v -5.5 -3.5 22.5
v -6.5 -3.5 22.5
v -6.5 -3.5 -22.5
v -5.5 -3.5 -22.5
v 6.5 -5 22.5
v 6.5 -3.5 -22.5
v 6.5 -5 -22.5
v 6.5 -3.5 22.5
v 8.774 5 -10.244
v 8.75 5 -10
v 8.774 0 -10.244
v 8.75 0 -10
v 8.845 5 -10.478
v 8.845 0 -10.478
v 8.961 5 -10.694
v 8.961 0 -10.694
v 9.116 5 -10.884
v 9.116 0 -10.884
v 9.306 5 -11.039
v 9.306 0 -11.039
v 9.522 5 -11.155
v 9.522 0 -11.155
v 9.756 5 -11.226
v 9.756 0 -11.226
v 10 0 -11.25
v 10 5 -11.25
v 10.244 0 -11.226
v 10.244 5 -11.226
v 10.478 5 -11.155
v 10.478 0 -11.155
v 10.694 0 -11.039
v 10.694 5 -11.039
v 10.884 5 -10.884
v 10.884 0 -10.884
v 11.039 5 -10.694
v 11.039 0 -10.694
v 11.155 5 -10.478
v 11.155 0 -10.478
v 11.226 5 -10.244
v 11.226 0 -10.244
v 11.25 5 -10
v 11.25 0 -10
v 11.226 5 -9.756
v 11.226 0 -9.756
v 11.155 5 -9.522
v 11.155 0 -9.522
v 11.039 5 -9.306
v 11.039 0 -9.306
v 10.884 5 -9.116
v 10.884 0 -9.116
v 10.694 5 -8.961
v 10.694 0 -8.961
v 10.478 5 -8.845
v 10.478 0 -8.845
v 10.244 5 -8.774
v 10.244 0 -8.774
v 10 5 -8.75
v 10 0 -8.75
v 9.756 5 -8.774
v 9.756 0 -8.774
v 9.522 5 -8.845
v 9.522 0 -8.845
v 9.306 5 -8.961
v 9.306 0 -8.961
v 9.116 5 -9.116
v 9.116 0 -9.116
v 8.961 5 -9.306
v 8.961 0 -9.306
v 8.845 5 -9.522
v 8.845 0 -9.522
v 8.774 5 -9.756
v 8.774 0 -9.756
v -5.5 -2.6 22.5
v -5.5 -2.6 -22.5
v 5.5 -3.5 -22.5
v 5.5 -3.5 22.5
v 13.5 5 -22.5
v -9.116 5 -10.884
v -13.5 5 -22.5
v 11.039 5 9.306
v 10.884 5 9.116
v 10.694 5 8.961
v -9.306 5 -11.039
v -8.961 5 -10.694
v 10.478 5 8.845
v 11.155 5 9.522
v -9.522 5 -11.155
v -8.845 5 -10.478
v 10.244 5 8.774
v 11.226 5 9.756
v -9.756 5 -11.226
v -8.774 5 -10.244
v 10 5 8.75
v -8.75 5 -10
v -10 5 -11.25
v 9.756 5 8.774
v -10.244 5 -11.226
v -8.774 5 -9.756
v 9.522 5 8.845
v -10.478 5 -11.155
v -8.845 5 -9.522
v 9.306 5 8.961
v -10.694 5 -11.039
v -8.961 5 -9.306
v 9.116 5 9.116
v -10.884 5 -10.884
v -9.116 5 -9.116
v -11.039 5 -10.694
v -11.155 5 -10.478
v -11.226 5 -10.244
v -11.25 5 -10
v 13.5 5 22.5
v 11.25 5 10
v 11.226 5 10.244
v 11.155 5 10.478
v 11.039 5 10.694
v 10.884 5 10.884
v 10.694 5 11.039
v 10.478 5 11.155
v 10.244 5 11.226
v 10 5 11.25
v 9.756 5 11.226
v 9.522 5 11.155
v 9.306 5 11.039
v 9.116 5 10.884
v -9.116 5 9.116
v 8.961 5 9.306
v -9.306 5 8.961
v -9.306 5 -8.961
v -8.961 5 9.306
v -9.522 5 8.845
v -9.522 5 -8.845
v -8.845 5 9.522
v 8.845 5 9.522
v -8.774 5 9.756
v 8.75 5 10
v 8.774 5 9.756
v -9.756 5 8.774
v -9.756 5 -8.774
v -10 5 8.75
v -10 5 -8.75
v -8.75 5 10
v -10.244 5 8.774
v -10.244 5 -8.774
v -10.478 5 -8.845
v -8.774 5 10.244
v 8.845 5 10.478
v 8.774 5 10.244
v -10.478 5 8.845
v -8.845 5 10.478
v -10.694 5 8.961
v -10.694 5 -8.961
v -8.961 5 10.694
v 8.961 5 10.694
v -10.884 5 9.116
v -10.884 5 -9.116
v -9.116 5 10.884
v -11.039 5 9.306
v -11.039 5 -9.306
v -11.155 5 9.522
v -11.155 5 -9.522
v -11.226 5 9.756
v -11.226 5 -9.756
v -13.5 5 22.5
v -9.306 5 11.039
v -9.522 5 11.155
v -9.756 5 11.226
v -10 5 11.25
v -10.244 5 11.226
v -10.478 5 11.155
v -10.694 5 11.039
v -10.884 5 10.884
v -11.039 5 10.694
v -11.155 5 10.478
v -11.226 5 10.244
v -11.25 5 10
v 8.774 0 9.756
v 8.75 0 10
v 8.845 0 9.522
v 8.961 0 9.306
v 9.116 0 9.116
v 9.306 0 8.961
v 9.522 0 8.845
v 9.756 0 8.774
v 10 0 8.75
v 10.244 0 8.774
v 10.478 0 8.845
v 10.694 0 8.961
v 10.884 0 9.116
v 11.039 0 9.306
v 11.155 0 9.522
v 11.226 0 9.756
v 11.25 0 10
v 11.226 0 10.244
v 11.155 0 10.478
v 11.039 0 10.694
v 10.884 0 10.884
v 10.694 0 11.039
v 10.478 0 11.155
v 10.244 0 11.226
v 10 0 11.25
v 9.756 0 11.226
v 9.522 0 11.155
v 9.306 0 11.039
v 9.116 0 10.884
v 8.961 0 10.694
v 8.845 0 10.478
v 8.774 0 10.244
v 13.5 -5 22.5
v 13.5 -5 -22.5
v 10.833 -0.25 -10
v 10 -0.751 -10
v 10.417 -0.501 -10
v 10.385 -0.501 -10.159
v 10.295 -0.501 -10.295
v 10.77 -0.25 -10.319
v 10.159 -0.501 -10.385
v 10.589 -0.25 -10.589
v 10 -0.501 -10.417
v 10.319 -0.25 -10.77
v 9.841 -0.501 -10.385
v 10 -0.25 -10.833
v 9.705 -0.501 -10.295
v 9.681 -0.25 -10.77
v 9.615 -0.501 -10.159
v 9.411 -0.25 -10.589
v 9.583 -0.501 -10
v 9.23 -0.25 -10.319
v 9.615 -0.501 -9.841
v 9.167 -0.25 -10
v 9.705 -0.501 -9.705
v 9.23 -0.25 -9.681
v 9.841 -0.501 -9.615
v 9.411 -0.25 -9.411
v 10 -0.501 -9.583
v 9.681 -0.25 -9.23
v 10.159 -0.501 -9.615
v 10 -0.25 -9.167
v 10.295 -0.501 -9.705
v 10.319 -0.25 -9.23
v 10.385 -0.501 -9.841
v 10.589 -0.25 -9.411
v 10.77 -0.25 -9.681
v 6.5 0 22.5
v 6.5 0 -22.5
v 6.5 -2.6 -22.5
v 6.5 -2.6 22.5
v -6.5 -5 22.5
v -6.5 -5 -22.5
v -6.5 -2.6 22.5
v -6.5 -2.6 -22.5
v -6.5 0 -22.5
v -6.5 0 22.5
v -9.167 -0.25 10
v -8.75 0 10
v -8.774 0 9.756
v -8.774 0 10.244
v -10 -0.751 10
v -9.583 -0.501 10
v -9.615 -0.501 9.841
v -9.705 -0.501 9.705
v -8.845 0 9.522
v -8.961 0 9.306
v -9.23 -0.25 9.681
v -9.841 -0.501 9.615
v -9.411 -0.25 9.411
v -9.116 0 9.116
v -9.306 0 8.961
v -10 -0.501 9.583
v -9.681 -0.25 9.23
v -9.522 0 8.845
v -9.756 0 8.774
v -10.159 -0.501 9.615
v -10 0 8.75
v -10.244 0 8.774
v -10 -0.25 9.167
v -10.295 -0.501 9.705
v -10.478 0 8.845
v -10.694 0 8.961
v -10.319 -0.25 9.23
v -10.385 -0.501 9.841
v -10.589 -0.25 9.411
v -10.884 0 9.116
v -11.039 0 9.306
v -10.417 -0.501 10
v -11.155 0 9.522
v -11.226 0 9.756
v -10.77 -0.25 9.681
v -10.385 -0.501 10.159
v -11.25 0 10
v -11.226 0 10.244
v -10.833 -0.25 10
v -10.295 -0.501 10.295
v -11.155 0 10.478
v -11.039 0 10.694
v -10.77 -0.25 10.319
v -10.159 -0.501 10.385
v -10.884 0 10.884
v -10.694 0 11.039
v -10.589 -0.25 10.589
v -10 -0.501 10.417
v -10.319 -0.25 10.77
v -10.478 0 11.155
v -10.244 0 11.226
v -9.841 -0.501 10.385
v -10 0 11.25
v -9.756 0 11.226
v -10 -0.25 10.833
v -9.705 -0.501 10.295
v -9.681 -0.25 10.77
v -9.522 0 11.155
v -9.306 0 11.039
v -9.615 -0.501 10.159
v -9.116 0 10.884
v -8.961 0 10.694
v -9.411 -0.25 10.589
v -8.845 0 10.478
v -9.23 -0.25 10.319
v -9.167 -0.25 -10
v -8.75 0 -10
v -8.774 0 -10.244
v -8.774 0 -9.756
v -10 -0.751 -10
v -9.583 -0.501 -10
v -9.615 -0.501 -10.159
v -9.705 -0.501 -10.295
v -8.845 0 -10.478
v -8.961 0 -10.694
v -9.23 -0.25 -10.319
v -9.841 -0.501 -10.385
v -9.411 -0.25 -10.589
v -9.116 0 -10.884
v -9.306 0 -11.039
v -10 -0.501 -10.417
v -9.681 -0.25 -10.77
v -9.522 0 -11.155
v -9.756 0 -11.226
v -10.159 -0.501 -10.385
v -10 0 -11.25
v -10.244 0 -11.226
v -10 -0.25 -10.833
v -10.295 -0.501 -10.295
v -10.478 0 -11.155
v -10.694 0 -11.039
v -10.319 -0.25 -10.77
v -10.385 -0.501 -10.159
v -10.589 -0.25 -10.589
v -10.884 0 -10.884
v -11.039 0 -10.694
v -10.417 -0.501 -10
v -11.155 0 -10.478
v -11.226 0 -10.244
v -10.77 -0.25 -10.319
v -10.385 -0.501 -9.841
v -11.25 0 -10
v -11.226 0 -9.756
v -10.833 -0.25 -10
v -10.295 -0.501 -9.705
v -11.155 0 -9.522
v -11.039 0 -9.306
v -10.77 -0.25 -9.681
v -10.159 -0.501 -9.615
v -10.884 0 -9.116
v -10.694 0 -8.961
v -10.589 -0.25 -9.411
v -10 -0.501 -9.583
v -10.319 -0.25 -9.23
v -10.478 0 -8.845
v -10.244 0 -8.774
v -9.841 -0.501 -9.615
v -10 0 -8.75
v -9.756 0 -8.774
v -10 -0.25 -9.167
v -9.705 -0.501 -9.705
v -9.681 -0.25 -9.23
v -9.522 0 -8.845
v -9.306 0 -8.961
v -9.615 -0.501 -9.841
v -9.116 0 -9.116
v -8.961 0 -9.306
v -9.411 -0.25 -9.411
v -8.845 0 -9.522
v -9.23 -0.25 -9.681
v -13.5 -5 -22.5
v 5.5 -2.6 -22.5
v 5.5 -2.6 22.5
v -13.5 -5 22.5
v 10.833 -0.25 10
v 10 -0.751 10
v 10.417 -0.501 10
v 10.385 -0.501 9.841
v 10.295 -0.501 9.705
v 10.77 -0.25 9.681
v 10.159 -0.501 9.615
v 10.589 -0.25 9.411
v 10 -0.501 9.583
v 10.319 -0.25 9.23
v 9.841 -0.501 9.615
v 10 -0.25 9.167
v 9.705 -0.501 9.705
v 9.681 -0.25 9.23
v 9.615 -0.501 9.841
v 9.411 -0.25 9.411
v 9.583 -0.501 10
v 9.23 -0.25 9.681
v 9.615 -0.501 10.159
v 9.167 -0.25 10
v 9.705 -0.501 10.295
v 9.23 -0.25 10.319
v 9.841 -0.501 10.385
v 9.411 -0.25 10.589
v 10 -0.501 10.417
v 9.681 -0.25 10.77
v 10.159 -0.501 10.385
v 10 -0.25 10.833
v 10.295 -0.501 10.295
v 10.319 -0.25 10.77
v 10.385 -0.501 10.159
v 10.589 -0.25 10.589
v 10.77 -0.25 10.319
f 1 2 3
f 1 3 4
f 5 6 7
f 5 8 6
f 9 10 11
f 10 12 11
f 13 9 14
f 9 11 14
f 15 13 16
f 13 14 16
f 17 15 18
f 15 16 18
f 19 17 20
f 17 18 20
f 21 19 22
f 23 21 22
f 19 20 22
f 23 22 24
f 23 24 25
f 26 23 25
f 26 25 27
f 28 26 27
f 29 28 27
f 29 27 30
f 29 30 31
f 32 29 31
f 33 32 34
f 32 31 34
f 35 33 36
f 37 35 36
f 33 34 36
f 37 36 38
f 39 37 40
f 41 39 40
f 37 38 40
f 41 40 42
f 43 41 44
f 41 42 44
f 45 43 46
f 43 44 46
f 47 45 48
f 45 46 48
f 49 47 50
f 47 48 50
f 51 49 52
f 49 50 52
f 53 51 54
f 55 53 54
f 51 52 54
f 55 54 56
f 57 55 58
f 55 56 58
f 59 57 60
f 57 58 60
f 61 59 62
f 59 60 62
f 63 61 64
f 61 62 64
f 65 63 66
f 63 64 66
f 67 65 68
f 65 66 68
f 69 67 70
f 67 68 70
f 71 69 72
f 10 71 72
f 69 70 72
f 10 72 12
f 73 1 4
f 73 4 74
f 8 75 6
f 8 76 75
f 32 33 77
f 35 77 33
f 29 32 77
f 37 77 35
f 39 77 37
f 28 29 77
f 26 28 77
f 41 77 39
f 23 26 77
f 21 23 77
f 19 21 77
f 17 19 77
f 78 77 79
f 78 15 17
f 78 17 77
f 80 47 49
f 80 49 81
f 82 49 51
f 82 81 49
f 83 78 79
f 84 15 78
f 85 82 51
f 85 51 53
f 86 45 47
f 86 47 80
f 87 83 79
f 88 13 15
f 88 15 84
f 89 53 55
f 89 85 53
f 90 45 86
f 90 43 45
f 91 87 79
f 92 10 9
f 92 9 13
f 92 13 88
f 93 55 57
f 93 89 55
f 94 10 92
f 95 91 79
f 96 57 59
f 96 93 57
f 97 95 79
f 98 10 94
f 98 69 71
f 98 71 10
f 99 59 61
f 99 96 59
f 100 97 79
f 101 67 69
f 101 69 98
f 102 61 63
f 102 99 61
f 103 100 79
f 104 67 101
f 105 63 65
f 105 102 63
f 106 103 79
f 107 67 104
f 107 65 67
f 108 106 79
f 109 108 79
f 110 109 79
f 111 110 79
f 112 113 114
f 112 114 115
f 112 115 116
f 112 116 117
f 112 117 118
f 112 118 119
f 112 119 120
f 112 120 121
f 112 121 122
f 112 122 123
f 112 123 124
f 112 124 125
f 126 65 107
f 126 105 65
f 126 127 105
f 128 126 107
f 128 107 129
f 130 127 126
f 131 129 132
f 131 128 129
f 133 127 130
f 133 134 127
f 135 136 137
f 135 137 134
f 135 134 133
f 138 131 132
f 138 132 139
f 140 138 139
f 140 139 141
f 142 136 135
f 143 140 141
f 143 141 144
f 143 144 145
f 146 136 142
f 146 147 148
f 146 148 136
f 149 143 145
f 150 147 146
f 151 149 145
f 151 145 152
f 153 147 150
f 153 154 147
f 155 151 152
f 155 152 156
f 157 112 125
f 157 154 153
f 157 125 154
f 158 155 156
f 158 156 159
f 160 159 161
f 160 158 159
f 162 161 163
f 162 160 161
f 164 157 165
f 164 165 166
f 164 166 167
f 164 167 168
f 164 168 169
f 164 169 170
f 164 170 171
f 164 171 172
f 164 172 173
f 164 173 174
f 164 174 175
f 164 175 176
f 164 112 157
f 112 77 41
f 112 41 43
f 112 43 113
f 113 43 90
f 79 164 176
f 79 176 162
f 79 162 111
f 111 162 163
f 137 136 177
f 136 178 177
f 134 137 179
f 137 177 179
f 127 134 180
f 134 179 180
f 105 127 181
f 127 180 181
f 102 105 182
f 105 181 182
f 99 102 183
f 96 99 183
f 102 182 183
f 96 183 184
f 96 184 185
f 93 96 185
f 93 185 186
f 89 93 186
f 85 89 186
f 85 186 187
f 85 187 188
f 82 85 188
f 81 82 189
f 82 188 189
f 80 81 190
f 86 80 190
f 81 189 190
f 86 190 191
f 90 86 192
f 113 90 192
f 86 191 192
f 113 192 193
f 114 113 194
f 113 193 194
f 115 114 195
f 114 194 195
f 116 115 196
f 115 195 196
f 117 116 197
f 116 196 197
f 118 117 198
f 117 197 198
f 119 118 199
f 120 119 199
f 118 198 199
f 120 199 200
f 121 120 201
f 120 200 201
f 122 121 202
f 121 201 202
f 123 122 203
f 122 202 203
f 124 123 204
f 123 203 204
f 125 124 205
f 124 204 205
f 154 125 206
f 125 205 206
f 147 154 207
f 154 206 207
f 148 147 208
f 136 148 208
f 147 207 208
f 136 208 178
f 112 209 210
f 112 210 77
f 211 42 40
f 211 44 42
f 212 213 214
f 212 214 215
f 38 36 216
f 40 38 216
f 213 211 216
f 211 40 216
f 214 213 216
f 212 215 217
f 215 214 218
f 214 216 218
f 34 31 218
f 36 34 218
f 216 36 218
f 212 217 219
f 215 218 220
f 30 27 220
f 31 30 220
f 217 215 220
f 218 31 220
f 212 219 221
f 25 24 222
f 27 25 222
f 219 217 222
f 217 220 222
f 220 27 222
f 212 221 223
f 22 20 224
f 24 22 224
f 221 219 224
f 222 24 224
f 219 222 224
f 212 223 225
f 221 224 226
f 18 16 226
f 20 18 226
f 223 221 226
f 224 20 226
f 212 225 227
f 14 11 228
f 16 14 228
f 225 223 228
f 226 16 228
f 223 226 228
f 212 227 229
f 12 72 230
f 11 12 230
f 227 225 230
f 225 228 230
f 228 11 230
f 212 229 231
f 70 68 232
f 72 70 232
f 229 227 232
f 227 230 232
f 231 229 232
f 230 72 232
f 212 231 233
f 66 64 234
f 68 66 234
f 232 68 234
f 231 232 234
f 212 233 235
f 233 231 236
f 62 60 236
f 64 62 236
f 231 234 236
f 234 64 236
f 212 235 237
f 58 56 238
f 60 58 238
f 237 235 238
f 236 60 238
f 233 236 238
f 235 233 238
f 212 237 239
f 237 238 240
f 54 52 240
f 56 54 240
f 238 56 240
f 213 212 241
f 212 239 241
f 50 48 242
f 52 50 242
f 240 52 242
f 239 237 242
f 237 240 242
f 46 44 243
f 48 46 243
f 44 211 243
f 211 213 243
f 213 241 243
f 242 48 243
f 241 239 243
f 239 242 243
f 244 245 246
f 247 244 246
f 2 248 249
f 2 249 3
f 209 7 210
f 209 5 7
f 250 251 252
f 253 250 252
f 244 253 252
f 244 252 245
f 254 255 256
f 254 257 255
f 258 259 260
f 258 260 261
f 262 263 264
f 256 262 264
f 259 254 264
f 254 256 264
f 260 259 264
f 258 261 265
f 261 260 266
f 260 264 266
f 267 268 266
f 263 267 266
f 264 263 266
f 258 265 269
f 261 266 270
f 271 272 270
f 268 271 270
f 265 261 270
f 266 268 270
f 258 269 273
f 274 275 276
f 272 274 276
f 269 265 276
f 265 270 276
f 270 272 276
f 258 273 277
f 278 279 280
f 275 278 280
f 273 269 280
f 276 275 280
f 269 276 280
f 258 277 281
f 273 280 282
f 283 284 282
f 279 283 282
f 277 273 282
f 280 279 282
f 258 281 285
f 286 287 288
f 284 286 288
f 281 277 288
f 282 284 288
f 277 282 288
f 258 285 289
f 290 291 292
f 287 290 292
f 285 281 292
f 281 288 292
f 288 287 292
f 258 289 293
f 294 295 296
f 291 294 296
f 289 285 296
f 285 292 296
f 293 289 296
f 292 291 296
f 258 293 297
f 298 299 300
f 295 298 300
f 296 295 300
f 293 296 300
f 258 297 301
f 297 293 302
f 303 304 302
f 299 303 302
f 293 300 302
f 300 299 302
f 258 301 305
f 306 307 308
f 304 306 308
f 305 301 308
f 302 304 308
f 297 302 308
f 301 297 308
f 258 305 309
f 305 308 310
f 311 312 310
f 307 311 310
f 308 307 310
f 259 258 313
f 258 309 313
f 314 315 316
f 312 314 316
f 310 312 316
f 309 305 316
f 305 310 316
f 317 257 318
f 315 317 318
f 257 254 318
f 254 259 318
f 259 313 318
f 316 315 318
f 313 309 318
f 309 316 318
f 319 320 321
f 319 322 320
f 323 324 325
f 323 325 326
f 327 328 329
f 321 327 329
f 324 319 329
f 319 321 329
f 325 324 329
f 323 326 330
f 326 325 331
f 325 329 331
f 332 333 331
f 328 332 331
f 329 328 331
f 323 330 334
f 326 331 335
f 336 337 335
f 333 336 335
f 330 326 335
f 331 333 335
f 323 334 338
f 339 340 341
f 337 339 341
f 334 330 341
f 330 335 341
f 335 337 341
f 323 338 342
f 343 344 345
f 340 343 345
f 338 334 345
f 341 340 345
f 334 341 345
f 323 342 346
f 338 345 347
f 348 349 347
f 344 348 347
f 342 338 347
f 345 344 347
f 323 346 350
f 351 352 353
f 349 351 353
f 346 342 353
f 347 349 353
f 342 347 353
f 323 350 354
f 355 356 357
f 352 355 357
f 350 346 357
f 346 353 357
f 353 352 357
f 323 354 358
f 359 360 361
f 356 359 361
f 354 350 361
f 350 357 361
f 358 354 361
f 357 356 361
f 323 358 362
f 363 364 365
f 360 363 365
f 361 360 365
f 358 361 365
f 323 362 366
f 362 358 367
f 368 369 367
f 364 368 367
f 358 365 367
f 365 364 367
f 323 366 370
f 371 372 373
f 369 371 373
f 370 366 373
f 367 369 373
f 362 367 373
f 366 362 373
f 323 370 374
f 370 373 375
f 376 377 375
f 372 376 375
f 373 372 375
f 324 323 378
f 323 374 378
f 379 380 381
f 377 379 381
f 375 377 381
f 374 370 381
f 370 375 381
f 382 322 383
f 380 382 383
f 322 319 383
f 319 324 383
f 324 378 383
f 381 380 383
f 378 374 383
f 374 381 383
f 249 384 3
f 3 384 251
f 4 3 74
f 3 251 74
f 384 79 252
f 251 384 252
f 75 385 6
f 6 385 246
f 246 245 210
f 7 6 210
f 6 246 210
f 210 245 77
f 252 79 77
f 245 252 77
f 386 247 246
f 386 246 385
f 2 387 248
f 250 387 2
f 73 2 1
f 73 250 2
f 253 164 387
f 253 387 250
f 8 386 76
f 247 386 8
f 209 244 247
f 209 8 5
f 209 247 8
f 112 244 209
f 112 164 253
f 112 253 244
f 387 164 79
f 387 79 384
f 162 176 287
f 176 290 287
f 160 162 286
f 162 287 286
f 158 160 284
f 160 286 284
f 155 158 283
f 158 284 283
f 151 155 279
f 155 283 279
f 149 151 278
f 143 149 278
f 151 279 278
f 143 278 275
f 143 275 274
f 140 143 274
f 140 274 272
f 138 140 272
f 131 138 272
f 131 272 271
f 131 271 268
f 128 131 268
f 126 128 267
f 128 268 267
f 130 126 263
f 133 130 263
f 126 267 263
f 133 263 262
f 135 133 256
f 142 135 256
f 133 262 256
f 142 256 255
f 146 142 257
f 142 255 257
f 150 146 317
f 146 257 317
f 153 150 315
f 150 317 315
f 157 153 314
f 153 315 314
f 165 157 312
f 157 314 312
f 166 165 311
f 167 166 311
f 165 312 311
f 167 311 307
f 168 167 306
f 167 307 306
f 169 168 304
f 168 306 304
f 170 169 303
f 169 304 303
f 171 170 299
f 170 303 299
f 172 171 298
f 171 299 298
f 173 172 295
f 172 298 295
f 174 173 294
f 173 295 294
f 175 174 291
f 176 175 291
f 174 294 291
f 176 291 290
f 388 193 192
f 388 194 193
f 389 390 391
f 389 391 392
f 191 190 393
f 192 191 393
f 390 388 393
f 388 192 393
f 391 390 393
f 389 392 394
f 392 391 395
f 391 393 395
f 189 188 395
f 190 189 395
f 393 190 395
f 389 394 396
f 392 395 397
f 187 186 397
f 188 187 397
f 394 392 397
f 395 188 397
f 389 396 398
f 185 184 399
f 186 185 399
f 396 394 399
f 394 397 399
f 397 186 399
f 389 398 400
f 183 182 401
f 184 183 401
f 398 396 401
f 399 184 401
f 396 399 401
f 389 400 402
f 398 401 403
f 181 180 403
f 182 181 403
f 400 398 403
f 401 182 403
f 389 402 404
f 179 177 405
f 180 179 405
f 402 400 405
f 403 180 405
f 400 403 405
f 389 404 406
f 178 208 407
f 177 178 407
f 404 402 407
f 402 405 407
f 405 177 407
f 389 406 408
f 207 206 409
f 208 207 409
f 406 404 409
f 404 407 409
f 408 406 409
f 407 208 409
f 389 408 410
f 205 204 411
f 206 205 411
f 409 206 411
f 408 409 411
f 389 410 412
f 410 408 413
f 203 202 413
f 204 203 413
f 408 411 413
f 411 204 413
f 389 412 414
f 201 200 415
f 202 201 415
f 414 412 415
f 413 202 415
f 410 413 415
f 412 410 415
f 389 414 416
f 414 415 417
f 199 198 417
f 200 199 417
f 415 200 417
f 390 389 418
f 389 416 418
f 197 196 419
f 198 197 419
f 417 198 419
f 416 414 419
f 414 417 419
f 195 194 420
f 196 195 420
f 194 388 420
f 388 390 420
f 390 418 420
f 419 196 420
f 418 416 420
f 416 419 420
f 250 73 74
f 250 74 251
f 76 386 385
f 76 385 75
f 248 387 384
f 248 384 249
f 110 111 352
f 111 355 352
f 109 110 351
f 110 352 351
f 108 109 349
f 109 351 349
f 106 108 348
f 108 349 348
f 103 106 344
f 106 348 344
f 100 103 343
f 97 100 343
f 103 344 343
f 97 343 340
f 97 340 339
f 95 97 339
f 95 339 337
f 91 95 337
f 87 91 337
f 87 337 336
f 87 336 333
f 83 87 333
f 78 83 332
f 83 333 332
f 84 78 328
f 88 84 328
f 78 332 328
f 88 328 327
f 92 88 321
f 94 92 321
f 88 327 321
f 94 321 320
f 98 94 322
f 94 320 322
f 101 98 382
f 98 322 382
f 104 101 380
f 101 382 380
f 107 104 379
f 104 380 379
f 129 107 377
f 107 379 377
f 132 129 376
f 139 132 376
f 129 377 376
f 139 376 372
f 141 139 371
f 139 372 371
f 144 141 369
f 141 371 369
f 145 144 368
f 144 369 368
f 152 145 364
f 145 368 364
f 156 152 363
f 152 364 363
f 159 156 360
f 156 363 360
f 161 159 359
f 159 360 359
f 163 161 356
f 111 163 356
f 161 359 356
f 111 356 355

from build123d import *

# Parameters (mm, degrees)
BOSS_EXTRU_1_DEPTH                            = 22.5
TROU_POUR_TARAUDAGE_POUR_TROU_TARAUD_M3_D     = 2.5
TROU_POUR_TARAUDAGE_POUR_TROU_TARAUD_M3_DEPTH = 5
TROU_POUR_TARAUDAGE_POUR_TROU_TARAUD_M3_TIP   = 0.751075774


with BuildPart() as part:
    # Esquisse1 → Boss.-Extru.1 (new body, symmetric)
    with BuildSketch(Plane.XY):
        Polygon((6.5, -5), (13.5, -5), (13.5, 5), (-13.5, 5), (-13.5, -5), (-6.5, -5), (-6.5, -3.5), (-5.5, -3.5), (-5.5, -2.6), (-6.5, -2.6), (-6.5, 0), (6.5, 0), (6.5, -2.6), (5.5, -2.6), (5.5, -3.5), (6.5, -3.5), align=None)
    extrude(amount=BOSS_EXTRU_1_DEPTH, both=True)

    # Trou pour taraudage pour trou taraudé M3x0.51
    with Locations(Plane(origin=(0, 5, 0), x_dir=(1, 0, 0), z_dir=(0, 1, 0))):
        with Locations((-10, 10), (-10, -10), (10, -10), (10, 10)):
            Hole(TROU_POUR_TARAUDAGE_POUR_TROU_TARAUD_M3_D / 2, depth=TROU_POUR_TARAUDAGE_POUR_TROU_TARAUD_M3_DEPTH)
            with Locations((0, 0, -(TROU_POUR_TARAUDAGE_POUR_TROU_TARAUD_M3_DEPTH + TROU_POUR_TARAUDAGE_POUR_TROU_TARAUD_M3_TIP / 2))):  # 118° drill point
                Cone(0, TROU_POUR_TARAUDAGE_POUR_TROU_TARAUD_M3_D / 2, TROU_POUR_TARAUDAGE_POUR_TROU_TARAUD_M3_TIP, mode=Mode.SUBTRACT)


solid = part.part
